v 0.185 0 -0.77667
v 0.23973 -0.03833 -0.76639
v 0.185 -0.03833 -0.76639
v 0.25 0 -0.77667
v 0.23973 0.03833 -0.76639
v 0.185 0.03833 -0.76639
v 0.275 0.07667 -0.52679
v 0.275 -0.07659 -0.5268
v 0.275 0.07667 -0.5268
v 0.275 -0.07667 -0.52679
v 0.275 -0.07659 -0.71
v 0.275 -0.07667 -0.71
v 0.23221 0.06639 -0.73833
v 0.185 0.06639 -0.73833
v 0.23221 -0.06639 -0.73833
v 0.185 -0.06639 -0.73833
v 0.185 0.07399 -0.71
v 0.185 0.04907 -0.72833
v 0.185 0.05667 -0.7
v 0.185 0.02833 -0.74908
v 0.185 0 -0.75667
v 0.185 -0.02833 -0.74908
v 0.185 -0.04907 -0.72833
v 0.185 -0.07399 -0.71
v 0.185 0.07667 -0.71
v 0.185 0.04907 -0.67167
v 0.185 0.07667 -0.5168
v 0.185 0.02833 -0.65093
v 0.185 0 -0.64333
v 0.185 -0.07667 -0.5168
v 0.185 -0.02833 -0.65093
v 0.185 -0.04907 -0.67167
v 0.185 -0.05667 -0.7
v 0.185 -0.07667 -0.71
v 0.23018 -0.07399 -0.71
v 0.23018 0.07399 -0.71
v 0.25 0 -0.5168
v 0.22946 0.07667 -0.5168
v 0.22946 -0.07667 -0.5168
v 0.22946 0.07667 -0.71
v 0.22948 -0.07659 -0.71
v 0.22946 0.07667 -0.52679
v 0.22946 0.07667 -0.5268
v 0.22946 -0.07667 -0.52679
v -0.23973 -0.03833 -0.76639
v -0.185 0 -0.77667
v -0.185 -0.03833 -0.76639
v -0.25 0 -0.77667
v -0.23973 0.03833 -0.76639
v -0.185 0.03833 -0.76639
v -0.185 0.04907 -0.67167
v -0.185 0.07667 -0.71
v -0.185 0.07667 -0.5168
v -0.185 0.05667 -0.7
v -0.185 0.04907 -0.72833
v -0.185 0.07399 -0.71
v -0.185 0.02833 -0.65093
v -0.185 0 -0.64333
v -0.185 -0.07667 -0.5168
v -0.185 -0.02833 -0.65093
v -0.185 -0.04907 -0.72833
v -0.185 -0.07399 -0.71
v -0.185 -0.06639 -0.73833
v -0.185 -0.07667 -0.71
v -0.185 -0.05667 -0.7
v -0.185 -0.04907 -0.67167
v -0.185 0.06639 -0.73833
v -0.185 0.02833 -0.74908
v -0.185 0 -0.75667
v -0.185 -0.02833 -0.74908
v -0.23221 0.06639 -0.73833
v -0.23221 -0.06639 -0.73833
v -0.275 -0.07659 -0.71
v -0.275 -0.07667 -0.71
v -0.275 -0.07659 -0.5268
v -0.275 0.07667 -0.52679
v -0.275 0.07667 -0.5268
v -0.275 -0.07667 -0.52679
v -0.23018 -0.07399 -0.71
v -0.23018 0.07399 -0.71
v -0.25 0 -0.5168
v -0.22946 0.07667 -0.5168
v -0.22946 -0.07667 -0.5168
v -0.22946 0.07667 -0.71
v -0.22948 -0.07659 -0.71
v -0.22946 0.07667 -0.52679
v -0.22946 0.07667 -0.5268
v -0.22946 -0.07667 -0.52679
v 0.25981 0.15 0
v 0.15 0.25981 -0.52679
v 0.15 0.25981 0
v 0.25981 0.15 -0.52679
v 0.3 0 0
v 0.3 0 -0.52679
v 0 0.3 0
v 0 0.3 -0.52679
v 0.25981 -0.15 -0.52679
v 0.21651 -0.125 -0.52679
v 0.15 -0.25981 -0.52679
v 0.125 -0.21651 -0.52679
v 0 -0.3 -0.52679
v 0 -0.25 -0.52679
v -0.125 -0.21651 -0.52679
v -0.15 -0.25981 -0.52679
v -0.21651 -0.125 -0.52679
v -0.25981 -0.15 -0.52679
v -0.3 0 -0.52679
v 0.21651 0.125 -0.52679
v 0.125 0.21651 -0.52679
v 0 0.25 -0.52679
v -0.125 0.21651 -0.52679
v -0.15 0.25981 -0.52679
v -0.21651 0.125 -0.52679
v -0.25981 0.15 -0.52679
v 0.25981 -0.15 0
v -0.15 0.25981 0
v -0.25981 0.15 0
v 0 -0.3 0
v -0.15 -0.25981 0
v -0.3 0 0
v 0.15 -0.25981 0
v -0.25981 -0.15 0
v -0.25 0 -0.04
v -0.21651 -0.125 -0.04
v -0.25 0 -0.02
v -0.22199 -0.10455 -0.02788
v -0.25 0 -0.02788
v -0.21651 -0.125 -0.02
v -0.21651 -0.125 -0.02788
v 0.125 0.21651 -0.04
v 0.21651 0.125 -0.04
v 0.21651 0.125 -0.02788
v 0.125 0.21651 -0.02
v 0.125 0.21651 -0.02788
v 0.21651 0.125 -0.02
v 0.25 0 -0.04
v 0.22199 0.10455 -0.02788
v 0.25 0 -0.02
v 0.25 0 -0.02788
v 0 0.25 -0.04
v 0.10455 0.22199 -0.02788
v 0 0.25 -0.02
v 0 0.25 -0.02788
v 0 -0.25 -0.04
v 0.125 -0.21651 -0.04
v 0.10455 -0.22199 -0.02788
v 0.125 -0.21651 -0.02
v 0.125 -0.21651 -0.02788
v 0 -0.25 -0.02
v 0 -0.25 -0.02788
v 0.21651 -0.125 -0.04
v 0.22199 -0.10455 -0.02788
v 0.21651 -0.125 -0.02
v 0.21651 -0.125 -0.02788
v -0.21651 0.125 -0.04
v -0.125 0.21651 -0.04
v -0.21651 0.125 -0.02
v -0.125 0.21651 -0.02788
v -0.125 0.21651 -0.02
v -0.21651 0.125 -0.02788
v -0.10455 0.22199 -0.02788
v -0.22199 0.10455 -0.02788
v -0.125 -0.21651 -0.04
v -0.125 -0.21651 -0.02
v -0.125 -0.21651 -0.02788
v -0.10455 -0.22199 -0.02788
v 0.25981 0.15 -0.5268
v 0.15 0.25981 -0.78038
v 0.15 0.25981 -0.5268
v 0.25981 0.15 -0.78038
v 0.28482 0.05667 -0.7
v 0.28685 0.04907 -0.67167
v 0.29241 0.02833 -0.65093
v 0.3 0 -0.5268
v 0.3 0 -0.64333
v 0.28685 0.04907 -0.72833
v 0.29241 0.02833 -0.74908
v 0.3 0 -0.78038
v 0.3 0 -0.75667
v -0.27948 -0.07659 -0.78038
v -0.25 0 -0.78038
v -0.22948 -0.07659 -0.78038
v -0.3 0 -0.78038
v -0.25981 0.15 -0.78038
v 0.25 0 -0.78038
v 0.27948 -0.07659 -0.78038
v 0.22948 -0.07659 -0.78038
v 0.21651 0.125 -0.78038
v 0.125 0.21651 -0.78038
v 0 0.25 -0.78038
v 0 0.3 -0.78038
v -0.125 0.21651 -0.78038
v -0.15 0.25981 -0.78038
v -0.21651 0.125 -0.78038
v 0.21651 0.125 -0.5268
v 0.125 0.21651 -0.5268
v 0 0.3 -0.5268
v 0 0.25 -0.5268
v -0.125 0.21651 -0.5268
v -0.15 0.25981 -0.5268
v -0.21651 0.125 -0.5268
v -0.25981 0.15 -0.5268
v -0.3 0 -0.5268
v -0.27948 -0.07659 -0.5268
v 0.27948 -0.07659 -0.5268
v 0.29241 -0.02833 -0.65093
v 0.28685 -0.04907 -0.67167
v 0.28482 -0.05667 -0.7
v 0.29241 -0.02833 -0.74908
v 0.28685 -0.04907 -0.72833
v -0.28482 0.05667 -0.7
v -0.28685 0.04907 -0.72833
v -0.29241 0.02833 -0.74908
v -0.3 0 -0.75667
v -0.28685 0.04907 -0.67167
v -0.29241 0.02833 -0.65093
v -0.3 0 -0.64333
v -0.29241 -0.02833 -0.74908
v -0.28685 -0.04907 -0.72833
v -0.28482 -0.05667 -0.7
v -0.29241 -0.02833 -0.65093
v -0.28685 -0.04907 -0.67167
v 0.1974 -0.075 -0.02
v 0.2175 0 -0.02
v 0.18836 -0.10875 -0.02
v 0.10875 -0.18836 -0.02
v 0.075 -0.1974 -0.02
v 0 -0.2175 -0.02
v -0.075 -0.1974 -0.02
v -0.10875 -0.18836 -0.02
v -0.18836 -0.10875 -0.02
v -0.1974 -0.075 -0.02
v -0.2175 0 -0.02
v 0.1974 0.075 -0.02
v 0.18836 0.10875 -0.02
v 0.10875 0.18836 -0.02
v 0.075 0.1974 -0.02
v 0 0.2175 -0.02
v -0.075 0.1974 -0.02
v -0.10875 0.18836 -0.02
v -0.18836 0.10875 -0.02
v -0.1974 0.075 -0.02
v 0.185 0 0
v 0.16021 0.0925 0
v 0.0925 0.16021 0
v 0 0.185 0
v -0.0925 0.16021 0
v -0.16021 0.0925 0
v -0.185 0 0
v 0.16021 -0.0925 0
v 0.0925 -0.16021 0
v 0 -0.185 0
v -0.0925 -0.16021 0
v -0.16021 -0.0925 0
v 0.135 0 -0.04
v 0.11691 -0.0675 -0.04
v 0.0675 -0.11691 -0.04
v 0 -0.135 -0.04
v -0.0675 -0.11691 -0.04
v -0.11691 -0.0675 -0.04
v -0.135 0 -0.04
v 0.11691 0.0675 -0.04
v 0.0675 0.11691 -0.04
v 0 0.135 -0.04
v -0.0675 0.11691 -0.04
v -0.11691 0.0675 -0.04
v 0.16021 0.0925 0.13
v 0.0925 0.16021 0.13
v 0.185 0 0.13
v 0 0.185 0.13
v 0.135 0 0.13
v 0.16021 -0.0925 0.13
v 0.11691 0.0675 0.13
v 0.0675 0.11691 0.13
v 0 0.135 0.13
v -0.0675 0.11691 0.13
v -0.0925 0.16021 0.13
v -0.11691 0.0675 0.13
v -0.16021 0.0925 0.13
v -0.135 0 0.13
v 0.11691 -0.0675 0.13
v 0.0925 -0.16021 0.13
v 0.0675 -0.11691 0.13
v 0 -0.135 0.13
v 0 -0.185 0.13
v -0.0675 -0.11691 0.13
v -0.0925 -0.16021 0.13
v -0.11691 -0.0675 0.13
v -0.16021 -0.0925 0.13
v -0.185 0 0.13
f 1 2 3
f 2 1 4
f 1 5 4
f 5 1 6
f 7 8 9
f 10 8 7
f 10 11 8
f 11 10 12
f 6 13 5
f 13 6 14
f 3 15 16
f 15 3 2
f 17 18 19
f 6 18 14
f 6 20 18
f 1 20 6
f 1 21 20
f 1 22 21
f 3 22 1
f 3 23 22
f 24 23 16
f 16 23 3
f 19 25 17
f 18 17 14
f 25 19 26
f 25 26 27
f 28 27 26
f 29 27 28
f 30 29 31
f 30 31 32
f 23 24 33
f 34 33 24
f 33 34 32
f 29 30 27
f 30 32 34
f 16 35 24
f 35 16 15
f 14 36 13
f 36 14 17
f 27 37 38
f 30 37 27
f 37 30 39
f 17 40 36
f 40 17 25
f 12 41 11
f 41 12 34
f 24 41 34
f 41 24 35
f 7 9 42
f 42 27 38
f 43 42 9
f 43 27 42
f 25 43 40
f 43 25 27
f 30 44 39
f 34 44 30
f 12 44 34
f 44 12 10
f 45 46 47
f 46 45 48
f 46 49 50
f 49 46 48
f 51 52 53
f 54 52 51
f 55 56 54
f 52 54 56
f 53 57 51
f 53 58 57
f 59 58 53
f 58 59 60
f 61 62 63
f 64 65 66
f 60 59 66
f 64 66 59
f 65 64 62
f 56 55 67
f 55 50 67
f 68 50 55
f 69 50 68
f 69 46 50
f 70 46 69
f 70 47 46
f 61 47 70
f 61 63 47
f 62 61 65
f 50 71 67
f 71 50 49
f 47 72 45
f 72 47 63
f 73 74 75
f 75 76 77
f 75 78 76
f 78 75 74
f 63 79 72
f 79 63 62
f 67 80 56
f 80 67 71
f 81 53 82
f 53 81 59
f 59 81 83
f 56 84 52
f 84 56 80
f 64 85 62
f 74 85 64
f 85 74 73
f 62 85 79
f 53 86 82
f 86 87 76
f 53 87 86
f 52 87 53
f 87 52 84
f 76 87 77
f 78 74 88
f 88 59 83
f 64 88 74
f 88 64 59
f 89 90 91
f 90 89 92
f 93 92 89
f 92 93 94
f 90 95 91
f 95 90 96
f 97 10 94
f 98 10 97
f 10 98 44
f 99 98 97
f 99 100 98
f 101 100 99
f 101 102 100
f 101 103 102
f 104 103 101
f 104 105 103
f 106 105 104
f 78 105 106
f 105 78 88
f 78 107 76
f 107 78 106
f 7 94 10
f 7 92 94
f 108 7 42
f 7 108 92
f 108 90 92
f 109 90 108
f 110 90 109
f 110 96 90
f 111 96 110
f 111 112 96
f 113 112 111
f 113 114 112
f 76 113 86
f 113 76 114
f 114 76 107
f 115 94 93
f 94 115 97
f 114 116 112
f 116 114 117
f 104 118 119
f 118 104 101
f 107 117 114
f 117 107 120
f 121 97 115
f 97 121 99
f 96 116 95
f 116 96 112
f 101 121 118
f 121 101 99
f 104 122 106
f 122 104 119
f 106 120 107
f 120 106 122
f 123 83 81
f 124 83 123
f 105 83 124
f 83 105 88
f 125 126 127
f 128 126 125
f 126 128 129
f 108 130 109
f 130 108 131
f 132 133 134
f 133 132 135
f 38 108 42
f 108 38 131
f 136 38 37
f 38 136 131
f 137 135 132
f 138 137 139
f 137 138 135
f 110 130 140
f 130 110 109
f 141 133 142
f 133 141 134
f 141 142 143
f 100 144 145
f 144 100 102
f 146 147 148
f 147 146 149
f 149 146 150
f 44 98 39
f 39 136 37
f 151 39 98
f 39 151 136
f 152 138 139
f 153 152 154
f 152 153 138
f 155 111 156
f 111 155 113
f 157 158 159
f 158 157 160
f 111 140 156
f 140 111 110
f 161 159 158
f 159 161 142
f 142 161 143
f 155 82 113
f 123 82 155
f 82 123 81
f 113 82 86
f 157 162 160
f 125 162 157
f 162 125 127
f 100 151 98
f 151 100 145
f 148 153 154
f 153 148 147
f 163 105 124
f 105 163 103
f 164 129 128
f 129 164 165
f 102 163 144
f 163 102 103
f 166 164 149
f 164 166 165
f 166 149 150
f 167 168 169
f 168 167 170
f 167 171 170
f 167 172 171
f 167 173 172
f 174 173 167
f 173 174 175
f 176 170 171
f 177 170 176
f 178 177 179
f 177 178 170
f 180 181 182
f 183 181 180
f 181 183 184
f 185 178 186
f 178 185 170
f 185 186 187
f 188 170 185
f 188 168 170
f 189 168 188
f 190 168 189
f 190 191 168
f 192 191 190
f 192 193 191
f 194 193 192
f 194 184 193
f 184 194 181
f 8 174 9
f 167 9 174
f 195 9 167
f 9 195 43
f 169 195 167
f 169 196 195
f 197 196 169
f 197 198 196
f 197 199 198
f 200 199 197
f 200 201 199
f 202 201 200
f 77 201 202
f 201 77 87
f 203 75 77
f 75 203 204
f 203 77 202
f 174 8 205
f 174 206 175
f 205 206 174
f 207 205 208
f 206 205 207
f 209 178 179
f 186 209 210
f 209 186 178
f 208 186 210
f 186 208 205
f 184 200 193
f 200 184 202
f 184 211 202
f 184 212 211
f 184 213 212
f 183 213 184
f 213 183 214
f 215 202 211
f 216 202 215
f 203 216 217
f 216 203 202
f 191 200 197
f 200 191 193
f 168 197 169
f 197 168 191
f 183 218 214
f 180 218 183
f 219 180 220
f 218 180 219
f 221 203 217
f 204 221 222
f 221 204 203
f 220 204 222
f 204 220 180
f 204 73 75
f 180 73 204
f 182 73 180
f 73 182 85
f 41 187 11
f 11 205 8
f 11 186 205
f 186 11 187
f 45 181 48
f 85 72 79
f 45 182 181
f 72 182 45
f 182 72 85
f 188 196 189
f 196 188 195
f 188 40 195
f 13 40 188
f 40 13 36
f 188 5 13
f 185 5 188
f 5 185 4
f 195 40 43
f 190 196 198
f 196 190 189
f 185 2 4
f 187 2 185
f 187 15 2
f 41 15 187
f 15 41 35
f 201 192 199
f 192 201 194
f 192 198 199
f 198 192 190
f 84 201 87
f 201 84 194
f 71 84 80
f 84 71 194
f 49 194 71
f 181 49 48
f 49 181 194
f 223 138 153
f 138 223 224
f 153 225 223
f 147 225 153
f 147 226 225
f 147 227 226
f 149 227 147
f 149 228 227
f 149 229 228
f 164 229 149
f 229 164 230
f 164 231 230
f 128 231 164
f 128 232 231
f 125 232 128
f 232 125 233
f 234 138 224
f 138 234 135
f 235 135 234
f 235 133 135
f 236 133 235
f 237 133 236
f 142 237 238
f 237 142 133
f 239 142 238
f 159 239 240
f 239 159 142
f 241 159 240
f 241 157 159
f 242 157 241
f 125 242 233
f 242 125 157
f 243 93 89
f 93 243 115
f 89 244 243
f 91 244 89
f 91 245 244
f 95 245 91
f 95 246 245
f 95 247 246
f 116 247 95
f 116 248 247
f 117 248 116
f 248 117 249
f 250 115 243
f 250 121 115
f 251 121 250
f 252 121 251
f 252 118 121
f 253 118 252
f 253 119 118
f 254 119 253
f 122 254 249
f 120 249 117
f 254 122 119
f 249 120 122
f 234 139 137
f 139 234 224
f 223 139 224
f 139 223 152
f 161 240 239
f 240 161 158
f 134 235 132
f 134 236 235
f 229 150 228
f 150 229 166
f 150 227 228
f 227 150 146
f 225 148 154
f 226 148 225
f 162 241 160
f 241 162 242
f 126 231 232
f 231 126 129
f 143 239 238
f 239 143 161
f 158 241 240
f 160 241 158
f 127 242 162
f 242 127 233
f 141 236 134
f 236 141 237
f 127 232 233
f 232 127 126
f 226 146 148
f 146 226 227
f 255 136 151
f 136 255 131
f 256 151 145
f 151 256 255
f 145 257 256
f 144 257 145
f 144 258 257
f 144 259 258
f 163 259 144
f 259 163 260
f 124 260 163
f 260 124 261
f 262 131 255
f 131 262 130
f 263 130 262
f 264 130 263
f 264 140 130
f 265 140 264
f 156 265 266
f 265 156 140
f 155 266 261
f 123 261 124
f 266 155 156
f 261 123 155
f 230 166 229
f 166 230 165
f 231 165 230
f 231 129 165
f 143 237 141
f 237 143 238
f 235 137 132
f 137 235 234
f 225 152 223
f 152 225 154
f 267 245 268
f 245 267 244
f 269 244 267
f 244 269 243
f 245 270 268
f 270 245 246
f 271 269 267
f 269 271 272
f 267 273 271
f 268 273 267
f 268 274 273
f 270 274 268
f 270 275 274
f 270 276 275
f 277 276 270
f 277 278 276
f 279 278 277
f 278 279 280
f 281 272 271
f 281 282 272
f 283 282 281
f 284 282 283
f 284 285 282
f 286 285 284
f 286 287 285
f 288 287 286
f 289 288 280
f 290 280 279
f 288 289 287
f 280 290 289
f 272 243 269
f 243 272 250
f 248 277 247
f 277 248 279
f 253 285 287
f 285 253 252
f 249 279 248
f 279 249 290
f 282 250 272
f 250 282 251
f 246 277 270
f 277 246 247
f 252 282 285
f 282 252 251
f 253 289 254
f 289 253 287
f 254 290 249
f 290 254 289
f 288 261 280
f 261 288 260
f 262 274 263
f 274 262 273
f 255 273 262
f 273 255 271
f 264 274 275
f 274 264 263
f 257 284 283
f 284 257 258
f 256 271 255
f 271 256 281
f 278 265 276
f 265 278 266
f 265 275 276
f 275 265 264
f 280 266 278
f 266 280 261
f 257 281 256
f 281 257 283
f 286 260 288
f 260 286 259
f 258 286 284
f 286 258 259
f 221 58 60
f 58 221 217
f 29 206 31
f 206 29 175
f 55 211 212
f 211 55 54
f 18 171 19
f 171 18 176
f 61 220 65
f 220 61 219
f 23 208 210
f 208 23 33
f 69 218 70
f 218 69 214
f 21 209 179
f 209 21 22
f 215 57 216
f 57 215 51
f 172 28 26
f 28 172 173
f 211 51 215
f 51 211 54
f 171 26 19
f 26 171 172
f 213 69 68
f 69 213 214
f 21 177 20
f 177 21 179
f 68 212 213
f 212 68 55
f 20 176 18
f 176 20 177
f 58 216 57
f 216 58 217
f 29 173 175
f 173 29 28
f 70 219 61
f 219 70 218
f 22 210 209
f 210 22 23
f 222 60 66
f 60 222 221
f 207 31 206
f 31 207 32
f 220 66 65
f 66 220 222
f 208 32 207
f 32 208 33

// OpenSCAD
tolerance = 0.015;
hole_radius = 0.045;
grid_hole_radius = 0.03;
outer_radius = 0.3;
thickness = 0.05;
hole_attach_height = 0.02;
attach_thickness = 0.02;
bottom_rotation_height = 1;
top_rotation_height = 0.7;
next_hole_radius = 0.045;
next_hole_attach_height = 0.02;
next_inner = 0.2;
max_turn = 60;
min_turn = -30;
hole_twist = 0;

//parameters that don't have to be defined explicitly
eps = tolerance/100;
inner_radius = outer_radius - thickness;
axle_offset = attach_thickness;
bottom_joint_attach_radius = outer_radius - hole_attach_height - grid_hole_radius*2 - thickness;
fn = 12;
fnh = 6;

//solve for b = axle height
max_turn_b = outer_radius / tan((180 - max_turn)/2);
min_turn_b = outer_radius / tan((180 - min_turn)/2);
axle_radius = bottom_joint_attach_radius/3;

grid_hole_height = hole_radius*2 + hole_attach_height * 2;
bottom_joint_grid_clearance = bottom_rotation_height - (hole_attach_height*2 + hole_radius*2 + grid_hole_height + max_turn_b + attach_thickness);

module angled_cylinder(angle_deg_y, _h, _r, angle_deg_x = 0) {
    rotate([angle_deg_x, angle_deg_y, 0]) { // Rotate the cylinder 
            cylinder(h = _h, r = _r, center = true, $fn = fnh);
        }
}

module joint_top() {
    operating_height = hole_attach_height*2 + attach_thickness + hole_radius*2 + grid_hole_height + bottom_joint_grid_clearance + max_turn_b;
    
    top_attach_height = axle_offset + axle_radius + max_turn_b;
    cyl_height = top_rotation_height - max_turn_b;

    difference() {
        translate([0,0, operating_height]) 
        difference() {
            union() {
                translate([0,0,- axle_radius - axle_offset + top_attach_height/2]) 
                {
                    
                    //attach points
                    axle_attach_thickness = outer_radius - thickness/2 - bottom_joint_attach_radius - tolerance ;
                    
                    attach_distance = bottom_joint_attach_radius + axle_attach_thickness/2 + tolerance;

                    translate([attach_distance, 0, 0]) {
                        translate([0,0,-top_attach_height/2 + axle_radius + axle_offset])
                        rotate([0,90,0])
                        cylinder(h=axle_attach_thickness,r=axle_radius + axle_offset,center=true, $fn = fn);
                        translate([0,0,(axle_radius + axle_offset)/2])
                    cube([axle_attach_thickness, (axle_radius + axle_offset)*2, top_attach_height - axle_offset - axle_radius + attach_thickness],center=true);
                    }
                    
                    translate([-attach_distance, 0, 0]) {
                        translate([0,0,-top_attach_height/2 + axle_radius + axle_offset])
                        rotate([0,90,0])
                        cylinder(h=axle_attach_thickness,r=axle_radius + axle_offset,center=true, $fn = fn);
                        translate([0,0,(axle_radius + axle_offset)/2])
                    cube([axle_attach_thickness, (axle_radius + axle_offset)*2, top_attach_height - axle_offset - axle_radius + attach_thickness],center=true);
                    }  
                    
                    //outer cylinder
                    translate([0,0,top_attach_height/2]) {
                        difference() {
                            cylinder(h=cyl_height,r=outer_radius,$fn=fn);
                            translate([0,0,-eps/2])
                            cylinder(h=cyl_height + eps,r=inner_radius,$fn=fn);
                        }
                        
                        //enforce min turn
                        translate([0,0,-(max_turn_b - min_turn_b)])
                        difference() {
                            cylinder(h=max_turn_b - min_turn_b,r=outer_radius,$fn=fn);
                            
                            translate([-outer_radius,-outer_radius,-eps/2])
                            cube([outer_radius*2,outer_radius - axle_radius - axle_offset + eps/2,max_turn_b - min_turn_b + eps]);
                            
                            translate([0,0,-eps/2])
                            cylinder(h=max_turn_b - min_turn_b + eps,r=inner_radius,$fn=fn);
                       }
                    }       
                } 
                
                
                //attachment segment
                translate([0,0,cyl_height + max_turn_b])
                difference() {
                        union() {
                            //attachment for smaller cylinder
                            translate([0,0,-attach_thickness])
                            cylinder(h=attach_thickness, r=outer_radius, $fn=fn);
                            translate([0,0,-attach_thickness*2])
                            cylinder(h=attach_thickness*2, r1=outer_radius, r2=next_inner - tolerance - thickness, $fn=fn);
                            
                            //small cylinder
                            cylinder(h=next_hole_radius*2 + next_hole_attach_height * 2, r = next_inner - tolerance, $fn=fn);
                        }
                        
                        //shelling
                        translate([0,0, -attach_thickness*2 - eps/2])
                        cylinder(h=next_hole_radius*2 + next_hole_attach_height * 2 + attach_thickness*2 + eps, r = min(inner_radius, next_inner - tolerance - thickness), $fn=fn);
                        
                        //holes for screws
//                        translate([0,0,next_hole_attach_height + next_hole_radius]) {
//                            angled_cylinder(0, (next_inner + thickness + eps) * 2,  next_hole_radius, 90);
//                            angled_cylinder(90, (next_inner + thickness + eps) * 2, next_hole_radius, 0);
//                        }
                    }

            }
            
            //holes for string routing
//             translate([0,-inner_radius + tolerance,max_turn_b]) 
//            rotate([90,0,0])
//            {
//                cylinder(h=thickness + inner_radius + tolerance,r=grid_hole_radius,$fn=fn);
//                translate([0,hole_attach_height + grid_hole_radius*2,0])
//                cylinder(h=thickness + inner_radius + tolerance,r=grid_hole_radius,$fn=fn);
//
//            }
//
//            translate([0,outer_radius + tolerance,min_turn_b])
//            rotate([90,0,0])
//            {
//                cylinder(h=thickness + inner_radius + tolerance,r=grid_hole_radius,$fn=fn);
//                translate([0,hole_attach_height + grid_hole_radius*2,0])
//                cylinder(h=thickness + inner_radius + tolerance,r=grid_hole_radius,$fn=fn);
//
//            }
             

        }

        //axle hole
        translate([0,0,operating_height])
        rotate([0,90,0])
        cylinder(h=outer_radius*2,r=axle_radius,center=true,$fn=fn);
        
    }
}

translate([0,0,-(bottom_rotation_height + top_rotation_height)])
joint_top();
